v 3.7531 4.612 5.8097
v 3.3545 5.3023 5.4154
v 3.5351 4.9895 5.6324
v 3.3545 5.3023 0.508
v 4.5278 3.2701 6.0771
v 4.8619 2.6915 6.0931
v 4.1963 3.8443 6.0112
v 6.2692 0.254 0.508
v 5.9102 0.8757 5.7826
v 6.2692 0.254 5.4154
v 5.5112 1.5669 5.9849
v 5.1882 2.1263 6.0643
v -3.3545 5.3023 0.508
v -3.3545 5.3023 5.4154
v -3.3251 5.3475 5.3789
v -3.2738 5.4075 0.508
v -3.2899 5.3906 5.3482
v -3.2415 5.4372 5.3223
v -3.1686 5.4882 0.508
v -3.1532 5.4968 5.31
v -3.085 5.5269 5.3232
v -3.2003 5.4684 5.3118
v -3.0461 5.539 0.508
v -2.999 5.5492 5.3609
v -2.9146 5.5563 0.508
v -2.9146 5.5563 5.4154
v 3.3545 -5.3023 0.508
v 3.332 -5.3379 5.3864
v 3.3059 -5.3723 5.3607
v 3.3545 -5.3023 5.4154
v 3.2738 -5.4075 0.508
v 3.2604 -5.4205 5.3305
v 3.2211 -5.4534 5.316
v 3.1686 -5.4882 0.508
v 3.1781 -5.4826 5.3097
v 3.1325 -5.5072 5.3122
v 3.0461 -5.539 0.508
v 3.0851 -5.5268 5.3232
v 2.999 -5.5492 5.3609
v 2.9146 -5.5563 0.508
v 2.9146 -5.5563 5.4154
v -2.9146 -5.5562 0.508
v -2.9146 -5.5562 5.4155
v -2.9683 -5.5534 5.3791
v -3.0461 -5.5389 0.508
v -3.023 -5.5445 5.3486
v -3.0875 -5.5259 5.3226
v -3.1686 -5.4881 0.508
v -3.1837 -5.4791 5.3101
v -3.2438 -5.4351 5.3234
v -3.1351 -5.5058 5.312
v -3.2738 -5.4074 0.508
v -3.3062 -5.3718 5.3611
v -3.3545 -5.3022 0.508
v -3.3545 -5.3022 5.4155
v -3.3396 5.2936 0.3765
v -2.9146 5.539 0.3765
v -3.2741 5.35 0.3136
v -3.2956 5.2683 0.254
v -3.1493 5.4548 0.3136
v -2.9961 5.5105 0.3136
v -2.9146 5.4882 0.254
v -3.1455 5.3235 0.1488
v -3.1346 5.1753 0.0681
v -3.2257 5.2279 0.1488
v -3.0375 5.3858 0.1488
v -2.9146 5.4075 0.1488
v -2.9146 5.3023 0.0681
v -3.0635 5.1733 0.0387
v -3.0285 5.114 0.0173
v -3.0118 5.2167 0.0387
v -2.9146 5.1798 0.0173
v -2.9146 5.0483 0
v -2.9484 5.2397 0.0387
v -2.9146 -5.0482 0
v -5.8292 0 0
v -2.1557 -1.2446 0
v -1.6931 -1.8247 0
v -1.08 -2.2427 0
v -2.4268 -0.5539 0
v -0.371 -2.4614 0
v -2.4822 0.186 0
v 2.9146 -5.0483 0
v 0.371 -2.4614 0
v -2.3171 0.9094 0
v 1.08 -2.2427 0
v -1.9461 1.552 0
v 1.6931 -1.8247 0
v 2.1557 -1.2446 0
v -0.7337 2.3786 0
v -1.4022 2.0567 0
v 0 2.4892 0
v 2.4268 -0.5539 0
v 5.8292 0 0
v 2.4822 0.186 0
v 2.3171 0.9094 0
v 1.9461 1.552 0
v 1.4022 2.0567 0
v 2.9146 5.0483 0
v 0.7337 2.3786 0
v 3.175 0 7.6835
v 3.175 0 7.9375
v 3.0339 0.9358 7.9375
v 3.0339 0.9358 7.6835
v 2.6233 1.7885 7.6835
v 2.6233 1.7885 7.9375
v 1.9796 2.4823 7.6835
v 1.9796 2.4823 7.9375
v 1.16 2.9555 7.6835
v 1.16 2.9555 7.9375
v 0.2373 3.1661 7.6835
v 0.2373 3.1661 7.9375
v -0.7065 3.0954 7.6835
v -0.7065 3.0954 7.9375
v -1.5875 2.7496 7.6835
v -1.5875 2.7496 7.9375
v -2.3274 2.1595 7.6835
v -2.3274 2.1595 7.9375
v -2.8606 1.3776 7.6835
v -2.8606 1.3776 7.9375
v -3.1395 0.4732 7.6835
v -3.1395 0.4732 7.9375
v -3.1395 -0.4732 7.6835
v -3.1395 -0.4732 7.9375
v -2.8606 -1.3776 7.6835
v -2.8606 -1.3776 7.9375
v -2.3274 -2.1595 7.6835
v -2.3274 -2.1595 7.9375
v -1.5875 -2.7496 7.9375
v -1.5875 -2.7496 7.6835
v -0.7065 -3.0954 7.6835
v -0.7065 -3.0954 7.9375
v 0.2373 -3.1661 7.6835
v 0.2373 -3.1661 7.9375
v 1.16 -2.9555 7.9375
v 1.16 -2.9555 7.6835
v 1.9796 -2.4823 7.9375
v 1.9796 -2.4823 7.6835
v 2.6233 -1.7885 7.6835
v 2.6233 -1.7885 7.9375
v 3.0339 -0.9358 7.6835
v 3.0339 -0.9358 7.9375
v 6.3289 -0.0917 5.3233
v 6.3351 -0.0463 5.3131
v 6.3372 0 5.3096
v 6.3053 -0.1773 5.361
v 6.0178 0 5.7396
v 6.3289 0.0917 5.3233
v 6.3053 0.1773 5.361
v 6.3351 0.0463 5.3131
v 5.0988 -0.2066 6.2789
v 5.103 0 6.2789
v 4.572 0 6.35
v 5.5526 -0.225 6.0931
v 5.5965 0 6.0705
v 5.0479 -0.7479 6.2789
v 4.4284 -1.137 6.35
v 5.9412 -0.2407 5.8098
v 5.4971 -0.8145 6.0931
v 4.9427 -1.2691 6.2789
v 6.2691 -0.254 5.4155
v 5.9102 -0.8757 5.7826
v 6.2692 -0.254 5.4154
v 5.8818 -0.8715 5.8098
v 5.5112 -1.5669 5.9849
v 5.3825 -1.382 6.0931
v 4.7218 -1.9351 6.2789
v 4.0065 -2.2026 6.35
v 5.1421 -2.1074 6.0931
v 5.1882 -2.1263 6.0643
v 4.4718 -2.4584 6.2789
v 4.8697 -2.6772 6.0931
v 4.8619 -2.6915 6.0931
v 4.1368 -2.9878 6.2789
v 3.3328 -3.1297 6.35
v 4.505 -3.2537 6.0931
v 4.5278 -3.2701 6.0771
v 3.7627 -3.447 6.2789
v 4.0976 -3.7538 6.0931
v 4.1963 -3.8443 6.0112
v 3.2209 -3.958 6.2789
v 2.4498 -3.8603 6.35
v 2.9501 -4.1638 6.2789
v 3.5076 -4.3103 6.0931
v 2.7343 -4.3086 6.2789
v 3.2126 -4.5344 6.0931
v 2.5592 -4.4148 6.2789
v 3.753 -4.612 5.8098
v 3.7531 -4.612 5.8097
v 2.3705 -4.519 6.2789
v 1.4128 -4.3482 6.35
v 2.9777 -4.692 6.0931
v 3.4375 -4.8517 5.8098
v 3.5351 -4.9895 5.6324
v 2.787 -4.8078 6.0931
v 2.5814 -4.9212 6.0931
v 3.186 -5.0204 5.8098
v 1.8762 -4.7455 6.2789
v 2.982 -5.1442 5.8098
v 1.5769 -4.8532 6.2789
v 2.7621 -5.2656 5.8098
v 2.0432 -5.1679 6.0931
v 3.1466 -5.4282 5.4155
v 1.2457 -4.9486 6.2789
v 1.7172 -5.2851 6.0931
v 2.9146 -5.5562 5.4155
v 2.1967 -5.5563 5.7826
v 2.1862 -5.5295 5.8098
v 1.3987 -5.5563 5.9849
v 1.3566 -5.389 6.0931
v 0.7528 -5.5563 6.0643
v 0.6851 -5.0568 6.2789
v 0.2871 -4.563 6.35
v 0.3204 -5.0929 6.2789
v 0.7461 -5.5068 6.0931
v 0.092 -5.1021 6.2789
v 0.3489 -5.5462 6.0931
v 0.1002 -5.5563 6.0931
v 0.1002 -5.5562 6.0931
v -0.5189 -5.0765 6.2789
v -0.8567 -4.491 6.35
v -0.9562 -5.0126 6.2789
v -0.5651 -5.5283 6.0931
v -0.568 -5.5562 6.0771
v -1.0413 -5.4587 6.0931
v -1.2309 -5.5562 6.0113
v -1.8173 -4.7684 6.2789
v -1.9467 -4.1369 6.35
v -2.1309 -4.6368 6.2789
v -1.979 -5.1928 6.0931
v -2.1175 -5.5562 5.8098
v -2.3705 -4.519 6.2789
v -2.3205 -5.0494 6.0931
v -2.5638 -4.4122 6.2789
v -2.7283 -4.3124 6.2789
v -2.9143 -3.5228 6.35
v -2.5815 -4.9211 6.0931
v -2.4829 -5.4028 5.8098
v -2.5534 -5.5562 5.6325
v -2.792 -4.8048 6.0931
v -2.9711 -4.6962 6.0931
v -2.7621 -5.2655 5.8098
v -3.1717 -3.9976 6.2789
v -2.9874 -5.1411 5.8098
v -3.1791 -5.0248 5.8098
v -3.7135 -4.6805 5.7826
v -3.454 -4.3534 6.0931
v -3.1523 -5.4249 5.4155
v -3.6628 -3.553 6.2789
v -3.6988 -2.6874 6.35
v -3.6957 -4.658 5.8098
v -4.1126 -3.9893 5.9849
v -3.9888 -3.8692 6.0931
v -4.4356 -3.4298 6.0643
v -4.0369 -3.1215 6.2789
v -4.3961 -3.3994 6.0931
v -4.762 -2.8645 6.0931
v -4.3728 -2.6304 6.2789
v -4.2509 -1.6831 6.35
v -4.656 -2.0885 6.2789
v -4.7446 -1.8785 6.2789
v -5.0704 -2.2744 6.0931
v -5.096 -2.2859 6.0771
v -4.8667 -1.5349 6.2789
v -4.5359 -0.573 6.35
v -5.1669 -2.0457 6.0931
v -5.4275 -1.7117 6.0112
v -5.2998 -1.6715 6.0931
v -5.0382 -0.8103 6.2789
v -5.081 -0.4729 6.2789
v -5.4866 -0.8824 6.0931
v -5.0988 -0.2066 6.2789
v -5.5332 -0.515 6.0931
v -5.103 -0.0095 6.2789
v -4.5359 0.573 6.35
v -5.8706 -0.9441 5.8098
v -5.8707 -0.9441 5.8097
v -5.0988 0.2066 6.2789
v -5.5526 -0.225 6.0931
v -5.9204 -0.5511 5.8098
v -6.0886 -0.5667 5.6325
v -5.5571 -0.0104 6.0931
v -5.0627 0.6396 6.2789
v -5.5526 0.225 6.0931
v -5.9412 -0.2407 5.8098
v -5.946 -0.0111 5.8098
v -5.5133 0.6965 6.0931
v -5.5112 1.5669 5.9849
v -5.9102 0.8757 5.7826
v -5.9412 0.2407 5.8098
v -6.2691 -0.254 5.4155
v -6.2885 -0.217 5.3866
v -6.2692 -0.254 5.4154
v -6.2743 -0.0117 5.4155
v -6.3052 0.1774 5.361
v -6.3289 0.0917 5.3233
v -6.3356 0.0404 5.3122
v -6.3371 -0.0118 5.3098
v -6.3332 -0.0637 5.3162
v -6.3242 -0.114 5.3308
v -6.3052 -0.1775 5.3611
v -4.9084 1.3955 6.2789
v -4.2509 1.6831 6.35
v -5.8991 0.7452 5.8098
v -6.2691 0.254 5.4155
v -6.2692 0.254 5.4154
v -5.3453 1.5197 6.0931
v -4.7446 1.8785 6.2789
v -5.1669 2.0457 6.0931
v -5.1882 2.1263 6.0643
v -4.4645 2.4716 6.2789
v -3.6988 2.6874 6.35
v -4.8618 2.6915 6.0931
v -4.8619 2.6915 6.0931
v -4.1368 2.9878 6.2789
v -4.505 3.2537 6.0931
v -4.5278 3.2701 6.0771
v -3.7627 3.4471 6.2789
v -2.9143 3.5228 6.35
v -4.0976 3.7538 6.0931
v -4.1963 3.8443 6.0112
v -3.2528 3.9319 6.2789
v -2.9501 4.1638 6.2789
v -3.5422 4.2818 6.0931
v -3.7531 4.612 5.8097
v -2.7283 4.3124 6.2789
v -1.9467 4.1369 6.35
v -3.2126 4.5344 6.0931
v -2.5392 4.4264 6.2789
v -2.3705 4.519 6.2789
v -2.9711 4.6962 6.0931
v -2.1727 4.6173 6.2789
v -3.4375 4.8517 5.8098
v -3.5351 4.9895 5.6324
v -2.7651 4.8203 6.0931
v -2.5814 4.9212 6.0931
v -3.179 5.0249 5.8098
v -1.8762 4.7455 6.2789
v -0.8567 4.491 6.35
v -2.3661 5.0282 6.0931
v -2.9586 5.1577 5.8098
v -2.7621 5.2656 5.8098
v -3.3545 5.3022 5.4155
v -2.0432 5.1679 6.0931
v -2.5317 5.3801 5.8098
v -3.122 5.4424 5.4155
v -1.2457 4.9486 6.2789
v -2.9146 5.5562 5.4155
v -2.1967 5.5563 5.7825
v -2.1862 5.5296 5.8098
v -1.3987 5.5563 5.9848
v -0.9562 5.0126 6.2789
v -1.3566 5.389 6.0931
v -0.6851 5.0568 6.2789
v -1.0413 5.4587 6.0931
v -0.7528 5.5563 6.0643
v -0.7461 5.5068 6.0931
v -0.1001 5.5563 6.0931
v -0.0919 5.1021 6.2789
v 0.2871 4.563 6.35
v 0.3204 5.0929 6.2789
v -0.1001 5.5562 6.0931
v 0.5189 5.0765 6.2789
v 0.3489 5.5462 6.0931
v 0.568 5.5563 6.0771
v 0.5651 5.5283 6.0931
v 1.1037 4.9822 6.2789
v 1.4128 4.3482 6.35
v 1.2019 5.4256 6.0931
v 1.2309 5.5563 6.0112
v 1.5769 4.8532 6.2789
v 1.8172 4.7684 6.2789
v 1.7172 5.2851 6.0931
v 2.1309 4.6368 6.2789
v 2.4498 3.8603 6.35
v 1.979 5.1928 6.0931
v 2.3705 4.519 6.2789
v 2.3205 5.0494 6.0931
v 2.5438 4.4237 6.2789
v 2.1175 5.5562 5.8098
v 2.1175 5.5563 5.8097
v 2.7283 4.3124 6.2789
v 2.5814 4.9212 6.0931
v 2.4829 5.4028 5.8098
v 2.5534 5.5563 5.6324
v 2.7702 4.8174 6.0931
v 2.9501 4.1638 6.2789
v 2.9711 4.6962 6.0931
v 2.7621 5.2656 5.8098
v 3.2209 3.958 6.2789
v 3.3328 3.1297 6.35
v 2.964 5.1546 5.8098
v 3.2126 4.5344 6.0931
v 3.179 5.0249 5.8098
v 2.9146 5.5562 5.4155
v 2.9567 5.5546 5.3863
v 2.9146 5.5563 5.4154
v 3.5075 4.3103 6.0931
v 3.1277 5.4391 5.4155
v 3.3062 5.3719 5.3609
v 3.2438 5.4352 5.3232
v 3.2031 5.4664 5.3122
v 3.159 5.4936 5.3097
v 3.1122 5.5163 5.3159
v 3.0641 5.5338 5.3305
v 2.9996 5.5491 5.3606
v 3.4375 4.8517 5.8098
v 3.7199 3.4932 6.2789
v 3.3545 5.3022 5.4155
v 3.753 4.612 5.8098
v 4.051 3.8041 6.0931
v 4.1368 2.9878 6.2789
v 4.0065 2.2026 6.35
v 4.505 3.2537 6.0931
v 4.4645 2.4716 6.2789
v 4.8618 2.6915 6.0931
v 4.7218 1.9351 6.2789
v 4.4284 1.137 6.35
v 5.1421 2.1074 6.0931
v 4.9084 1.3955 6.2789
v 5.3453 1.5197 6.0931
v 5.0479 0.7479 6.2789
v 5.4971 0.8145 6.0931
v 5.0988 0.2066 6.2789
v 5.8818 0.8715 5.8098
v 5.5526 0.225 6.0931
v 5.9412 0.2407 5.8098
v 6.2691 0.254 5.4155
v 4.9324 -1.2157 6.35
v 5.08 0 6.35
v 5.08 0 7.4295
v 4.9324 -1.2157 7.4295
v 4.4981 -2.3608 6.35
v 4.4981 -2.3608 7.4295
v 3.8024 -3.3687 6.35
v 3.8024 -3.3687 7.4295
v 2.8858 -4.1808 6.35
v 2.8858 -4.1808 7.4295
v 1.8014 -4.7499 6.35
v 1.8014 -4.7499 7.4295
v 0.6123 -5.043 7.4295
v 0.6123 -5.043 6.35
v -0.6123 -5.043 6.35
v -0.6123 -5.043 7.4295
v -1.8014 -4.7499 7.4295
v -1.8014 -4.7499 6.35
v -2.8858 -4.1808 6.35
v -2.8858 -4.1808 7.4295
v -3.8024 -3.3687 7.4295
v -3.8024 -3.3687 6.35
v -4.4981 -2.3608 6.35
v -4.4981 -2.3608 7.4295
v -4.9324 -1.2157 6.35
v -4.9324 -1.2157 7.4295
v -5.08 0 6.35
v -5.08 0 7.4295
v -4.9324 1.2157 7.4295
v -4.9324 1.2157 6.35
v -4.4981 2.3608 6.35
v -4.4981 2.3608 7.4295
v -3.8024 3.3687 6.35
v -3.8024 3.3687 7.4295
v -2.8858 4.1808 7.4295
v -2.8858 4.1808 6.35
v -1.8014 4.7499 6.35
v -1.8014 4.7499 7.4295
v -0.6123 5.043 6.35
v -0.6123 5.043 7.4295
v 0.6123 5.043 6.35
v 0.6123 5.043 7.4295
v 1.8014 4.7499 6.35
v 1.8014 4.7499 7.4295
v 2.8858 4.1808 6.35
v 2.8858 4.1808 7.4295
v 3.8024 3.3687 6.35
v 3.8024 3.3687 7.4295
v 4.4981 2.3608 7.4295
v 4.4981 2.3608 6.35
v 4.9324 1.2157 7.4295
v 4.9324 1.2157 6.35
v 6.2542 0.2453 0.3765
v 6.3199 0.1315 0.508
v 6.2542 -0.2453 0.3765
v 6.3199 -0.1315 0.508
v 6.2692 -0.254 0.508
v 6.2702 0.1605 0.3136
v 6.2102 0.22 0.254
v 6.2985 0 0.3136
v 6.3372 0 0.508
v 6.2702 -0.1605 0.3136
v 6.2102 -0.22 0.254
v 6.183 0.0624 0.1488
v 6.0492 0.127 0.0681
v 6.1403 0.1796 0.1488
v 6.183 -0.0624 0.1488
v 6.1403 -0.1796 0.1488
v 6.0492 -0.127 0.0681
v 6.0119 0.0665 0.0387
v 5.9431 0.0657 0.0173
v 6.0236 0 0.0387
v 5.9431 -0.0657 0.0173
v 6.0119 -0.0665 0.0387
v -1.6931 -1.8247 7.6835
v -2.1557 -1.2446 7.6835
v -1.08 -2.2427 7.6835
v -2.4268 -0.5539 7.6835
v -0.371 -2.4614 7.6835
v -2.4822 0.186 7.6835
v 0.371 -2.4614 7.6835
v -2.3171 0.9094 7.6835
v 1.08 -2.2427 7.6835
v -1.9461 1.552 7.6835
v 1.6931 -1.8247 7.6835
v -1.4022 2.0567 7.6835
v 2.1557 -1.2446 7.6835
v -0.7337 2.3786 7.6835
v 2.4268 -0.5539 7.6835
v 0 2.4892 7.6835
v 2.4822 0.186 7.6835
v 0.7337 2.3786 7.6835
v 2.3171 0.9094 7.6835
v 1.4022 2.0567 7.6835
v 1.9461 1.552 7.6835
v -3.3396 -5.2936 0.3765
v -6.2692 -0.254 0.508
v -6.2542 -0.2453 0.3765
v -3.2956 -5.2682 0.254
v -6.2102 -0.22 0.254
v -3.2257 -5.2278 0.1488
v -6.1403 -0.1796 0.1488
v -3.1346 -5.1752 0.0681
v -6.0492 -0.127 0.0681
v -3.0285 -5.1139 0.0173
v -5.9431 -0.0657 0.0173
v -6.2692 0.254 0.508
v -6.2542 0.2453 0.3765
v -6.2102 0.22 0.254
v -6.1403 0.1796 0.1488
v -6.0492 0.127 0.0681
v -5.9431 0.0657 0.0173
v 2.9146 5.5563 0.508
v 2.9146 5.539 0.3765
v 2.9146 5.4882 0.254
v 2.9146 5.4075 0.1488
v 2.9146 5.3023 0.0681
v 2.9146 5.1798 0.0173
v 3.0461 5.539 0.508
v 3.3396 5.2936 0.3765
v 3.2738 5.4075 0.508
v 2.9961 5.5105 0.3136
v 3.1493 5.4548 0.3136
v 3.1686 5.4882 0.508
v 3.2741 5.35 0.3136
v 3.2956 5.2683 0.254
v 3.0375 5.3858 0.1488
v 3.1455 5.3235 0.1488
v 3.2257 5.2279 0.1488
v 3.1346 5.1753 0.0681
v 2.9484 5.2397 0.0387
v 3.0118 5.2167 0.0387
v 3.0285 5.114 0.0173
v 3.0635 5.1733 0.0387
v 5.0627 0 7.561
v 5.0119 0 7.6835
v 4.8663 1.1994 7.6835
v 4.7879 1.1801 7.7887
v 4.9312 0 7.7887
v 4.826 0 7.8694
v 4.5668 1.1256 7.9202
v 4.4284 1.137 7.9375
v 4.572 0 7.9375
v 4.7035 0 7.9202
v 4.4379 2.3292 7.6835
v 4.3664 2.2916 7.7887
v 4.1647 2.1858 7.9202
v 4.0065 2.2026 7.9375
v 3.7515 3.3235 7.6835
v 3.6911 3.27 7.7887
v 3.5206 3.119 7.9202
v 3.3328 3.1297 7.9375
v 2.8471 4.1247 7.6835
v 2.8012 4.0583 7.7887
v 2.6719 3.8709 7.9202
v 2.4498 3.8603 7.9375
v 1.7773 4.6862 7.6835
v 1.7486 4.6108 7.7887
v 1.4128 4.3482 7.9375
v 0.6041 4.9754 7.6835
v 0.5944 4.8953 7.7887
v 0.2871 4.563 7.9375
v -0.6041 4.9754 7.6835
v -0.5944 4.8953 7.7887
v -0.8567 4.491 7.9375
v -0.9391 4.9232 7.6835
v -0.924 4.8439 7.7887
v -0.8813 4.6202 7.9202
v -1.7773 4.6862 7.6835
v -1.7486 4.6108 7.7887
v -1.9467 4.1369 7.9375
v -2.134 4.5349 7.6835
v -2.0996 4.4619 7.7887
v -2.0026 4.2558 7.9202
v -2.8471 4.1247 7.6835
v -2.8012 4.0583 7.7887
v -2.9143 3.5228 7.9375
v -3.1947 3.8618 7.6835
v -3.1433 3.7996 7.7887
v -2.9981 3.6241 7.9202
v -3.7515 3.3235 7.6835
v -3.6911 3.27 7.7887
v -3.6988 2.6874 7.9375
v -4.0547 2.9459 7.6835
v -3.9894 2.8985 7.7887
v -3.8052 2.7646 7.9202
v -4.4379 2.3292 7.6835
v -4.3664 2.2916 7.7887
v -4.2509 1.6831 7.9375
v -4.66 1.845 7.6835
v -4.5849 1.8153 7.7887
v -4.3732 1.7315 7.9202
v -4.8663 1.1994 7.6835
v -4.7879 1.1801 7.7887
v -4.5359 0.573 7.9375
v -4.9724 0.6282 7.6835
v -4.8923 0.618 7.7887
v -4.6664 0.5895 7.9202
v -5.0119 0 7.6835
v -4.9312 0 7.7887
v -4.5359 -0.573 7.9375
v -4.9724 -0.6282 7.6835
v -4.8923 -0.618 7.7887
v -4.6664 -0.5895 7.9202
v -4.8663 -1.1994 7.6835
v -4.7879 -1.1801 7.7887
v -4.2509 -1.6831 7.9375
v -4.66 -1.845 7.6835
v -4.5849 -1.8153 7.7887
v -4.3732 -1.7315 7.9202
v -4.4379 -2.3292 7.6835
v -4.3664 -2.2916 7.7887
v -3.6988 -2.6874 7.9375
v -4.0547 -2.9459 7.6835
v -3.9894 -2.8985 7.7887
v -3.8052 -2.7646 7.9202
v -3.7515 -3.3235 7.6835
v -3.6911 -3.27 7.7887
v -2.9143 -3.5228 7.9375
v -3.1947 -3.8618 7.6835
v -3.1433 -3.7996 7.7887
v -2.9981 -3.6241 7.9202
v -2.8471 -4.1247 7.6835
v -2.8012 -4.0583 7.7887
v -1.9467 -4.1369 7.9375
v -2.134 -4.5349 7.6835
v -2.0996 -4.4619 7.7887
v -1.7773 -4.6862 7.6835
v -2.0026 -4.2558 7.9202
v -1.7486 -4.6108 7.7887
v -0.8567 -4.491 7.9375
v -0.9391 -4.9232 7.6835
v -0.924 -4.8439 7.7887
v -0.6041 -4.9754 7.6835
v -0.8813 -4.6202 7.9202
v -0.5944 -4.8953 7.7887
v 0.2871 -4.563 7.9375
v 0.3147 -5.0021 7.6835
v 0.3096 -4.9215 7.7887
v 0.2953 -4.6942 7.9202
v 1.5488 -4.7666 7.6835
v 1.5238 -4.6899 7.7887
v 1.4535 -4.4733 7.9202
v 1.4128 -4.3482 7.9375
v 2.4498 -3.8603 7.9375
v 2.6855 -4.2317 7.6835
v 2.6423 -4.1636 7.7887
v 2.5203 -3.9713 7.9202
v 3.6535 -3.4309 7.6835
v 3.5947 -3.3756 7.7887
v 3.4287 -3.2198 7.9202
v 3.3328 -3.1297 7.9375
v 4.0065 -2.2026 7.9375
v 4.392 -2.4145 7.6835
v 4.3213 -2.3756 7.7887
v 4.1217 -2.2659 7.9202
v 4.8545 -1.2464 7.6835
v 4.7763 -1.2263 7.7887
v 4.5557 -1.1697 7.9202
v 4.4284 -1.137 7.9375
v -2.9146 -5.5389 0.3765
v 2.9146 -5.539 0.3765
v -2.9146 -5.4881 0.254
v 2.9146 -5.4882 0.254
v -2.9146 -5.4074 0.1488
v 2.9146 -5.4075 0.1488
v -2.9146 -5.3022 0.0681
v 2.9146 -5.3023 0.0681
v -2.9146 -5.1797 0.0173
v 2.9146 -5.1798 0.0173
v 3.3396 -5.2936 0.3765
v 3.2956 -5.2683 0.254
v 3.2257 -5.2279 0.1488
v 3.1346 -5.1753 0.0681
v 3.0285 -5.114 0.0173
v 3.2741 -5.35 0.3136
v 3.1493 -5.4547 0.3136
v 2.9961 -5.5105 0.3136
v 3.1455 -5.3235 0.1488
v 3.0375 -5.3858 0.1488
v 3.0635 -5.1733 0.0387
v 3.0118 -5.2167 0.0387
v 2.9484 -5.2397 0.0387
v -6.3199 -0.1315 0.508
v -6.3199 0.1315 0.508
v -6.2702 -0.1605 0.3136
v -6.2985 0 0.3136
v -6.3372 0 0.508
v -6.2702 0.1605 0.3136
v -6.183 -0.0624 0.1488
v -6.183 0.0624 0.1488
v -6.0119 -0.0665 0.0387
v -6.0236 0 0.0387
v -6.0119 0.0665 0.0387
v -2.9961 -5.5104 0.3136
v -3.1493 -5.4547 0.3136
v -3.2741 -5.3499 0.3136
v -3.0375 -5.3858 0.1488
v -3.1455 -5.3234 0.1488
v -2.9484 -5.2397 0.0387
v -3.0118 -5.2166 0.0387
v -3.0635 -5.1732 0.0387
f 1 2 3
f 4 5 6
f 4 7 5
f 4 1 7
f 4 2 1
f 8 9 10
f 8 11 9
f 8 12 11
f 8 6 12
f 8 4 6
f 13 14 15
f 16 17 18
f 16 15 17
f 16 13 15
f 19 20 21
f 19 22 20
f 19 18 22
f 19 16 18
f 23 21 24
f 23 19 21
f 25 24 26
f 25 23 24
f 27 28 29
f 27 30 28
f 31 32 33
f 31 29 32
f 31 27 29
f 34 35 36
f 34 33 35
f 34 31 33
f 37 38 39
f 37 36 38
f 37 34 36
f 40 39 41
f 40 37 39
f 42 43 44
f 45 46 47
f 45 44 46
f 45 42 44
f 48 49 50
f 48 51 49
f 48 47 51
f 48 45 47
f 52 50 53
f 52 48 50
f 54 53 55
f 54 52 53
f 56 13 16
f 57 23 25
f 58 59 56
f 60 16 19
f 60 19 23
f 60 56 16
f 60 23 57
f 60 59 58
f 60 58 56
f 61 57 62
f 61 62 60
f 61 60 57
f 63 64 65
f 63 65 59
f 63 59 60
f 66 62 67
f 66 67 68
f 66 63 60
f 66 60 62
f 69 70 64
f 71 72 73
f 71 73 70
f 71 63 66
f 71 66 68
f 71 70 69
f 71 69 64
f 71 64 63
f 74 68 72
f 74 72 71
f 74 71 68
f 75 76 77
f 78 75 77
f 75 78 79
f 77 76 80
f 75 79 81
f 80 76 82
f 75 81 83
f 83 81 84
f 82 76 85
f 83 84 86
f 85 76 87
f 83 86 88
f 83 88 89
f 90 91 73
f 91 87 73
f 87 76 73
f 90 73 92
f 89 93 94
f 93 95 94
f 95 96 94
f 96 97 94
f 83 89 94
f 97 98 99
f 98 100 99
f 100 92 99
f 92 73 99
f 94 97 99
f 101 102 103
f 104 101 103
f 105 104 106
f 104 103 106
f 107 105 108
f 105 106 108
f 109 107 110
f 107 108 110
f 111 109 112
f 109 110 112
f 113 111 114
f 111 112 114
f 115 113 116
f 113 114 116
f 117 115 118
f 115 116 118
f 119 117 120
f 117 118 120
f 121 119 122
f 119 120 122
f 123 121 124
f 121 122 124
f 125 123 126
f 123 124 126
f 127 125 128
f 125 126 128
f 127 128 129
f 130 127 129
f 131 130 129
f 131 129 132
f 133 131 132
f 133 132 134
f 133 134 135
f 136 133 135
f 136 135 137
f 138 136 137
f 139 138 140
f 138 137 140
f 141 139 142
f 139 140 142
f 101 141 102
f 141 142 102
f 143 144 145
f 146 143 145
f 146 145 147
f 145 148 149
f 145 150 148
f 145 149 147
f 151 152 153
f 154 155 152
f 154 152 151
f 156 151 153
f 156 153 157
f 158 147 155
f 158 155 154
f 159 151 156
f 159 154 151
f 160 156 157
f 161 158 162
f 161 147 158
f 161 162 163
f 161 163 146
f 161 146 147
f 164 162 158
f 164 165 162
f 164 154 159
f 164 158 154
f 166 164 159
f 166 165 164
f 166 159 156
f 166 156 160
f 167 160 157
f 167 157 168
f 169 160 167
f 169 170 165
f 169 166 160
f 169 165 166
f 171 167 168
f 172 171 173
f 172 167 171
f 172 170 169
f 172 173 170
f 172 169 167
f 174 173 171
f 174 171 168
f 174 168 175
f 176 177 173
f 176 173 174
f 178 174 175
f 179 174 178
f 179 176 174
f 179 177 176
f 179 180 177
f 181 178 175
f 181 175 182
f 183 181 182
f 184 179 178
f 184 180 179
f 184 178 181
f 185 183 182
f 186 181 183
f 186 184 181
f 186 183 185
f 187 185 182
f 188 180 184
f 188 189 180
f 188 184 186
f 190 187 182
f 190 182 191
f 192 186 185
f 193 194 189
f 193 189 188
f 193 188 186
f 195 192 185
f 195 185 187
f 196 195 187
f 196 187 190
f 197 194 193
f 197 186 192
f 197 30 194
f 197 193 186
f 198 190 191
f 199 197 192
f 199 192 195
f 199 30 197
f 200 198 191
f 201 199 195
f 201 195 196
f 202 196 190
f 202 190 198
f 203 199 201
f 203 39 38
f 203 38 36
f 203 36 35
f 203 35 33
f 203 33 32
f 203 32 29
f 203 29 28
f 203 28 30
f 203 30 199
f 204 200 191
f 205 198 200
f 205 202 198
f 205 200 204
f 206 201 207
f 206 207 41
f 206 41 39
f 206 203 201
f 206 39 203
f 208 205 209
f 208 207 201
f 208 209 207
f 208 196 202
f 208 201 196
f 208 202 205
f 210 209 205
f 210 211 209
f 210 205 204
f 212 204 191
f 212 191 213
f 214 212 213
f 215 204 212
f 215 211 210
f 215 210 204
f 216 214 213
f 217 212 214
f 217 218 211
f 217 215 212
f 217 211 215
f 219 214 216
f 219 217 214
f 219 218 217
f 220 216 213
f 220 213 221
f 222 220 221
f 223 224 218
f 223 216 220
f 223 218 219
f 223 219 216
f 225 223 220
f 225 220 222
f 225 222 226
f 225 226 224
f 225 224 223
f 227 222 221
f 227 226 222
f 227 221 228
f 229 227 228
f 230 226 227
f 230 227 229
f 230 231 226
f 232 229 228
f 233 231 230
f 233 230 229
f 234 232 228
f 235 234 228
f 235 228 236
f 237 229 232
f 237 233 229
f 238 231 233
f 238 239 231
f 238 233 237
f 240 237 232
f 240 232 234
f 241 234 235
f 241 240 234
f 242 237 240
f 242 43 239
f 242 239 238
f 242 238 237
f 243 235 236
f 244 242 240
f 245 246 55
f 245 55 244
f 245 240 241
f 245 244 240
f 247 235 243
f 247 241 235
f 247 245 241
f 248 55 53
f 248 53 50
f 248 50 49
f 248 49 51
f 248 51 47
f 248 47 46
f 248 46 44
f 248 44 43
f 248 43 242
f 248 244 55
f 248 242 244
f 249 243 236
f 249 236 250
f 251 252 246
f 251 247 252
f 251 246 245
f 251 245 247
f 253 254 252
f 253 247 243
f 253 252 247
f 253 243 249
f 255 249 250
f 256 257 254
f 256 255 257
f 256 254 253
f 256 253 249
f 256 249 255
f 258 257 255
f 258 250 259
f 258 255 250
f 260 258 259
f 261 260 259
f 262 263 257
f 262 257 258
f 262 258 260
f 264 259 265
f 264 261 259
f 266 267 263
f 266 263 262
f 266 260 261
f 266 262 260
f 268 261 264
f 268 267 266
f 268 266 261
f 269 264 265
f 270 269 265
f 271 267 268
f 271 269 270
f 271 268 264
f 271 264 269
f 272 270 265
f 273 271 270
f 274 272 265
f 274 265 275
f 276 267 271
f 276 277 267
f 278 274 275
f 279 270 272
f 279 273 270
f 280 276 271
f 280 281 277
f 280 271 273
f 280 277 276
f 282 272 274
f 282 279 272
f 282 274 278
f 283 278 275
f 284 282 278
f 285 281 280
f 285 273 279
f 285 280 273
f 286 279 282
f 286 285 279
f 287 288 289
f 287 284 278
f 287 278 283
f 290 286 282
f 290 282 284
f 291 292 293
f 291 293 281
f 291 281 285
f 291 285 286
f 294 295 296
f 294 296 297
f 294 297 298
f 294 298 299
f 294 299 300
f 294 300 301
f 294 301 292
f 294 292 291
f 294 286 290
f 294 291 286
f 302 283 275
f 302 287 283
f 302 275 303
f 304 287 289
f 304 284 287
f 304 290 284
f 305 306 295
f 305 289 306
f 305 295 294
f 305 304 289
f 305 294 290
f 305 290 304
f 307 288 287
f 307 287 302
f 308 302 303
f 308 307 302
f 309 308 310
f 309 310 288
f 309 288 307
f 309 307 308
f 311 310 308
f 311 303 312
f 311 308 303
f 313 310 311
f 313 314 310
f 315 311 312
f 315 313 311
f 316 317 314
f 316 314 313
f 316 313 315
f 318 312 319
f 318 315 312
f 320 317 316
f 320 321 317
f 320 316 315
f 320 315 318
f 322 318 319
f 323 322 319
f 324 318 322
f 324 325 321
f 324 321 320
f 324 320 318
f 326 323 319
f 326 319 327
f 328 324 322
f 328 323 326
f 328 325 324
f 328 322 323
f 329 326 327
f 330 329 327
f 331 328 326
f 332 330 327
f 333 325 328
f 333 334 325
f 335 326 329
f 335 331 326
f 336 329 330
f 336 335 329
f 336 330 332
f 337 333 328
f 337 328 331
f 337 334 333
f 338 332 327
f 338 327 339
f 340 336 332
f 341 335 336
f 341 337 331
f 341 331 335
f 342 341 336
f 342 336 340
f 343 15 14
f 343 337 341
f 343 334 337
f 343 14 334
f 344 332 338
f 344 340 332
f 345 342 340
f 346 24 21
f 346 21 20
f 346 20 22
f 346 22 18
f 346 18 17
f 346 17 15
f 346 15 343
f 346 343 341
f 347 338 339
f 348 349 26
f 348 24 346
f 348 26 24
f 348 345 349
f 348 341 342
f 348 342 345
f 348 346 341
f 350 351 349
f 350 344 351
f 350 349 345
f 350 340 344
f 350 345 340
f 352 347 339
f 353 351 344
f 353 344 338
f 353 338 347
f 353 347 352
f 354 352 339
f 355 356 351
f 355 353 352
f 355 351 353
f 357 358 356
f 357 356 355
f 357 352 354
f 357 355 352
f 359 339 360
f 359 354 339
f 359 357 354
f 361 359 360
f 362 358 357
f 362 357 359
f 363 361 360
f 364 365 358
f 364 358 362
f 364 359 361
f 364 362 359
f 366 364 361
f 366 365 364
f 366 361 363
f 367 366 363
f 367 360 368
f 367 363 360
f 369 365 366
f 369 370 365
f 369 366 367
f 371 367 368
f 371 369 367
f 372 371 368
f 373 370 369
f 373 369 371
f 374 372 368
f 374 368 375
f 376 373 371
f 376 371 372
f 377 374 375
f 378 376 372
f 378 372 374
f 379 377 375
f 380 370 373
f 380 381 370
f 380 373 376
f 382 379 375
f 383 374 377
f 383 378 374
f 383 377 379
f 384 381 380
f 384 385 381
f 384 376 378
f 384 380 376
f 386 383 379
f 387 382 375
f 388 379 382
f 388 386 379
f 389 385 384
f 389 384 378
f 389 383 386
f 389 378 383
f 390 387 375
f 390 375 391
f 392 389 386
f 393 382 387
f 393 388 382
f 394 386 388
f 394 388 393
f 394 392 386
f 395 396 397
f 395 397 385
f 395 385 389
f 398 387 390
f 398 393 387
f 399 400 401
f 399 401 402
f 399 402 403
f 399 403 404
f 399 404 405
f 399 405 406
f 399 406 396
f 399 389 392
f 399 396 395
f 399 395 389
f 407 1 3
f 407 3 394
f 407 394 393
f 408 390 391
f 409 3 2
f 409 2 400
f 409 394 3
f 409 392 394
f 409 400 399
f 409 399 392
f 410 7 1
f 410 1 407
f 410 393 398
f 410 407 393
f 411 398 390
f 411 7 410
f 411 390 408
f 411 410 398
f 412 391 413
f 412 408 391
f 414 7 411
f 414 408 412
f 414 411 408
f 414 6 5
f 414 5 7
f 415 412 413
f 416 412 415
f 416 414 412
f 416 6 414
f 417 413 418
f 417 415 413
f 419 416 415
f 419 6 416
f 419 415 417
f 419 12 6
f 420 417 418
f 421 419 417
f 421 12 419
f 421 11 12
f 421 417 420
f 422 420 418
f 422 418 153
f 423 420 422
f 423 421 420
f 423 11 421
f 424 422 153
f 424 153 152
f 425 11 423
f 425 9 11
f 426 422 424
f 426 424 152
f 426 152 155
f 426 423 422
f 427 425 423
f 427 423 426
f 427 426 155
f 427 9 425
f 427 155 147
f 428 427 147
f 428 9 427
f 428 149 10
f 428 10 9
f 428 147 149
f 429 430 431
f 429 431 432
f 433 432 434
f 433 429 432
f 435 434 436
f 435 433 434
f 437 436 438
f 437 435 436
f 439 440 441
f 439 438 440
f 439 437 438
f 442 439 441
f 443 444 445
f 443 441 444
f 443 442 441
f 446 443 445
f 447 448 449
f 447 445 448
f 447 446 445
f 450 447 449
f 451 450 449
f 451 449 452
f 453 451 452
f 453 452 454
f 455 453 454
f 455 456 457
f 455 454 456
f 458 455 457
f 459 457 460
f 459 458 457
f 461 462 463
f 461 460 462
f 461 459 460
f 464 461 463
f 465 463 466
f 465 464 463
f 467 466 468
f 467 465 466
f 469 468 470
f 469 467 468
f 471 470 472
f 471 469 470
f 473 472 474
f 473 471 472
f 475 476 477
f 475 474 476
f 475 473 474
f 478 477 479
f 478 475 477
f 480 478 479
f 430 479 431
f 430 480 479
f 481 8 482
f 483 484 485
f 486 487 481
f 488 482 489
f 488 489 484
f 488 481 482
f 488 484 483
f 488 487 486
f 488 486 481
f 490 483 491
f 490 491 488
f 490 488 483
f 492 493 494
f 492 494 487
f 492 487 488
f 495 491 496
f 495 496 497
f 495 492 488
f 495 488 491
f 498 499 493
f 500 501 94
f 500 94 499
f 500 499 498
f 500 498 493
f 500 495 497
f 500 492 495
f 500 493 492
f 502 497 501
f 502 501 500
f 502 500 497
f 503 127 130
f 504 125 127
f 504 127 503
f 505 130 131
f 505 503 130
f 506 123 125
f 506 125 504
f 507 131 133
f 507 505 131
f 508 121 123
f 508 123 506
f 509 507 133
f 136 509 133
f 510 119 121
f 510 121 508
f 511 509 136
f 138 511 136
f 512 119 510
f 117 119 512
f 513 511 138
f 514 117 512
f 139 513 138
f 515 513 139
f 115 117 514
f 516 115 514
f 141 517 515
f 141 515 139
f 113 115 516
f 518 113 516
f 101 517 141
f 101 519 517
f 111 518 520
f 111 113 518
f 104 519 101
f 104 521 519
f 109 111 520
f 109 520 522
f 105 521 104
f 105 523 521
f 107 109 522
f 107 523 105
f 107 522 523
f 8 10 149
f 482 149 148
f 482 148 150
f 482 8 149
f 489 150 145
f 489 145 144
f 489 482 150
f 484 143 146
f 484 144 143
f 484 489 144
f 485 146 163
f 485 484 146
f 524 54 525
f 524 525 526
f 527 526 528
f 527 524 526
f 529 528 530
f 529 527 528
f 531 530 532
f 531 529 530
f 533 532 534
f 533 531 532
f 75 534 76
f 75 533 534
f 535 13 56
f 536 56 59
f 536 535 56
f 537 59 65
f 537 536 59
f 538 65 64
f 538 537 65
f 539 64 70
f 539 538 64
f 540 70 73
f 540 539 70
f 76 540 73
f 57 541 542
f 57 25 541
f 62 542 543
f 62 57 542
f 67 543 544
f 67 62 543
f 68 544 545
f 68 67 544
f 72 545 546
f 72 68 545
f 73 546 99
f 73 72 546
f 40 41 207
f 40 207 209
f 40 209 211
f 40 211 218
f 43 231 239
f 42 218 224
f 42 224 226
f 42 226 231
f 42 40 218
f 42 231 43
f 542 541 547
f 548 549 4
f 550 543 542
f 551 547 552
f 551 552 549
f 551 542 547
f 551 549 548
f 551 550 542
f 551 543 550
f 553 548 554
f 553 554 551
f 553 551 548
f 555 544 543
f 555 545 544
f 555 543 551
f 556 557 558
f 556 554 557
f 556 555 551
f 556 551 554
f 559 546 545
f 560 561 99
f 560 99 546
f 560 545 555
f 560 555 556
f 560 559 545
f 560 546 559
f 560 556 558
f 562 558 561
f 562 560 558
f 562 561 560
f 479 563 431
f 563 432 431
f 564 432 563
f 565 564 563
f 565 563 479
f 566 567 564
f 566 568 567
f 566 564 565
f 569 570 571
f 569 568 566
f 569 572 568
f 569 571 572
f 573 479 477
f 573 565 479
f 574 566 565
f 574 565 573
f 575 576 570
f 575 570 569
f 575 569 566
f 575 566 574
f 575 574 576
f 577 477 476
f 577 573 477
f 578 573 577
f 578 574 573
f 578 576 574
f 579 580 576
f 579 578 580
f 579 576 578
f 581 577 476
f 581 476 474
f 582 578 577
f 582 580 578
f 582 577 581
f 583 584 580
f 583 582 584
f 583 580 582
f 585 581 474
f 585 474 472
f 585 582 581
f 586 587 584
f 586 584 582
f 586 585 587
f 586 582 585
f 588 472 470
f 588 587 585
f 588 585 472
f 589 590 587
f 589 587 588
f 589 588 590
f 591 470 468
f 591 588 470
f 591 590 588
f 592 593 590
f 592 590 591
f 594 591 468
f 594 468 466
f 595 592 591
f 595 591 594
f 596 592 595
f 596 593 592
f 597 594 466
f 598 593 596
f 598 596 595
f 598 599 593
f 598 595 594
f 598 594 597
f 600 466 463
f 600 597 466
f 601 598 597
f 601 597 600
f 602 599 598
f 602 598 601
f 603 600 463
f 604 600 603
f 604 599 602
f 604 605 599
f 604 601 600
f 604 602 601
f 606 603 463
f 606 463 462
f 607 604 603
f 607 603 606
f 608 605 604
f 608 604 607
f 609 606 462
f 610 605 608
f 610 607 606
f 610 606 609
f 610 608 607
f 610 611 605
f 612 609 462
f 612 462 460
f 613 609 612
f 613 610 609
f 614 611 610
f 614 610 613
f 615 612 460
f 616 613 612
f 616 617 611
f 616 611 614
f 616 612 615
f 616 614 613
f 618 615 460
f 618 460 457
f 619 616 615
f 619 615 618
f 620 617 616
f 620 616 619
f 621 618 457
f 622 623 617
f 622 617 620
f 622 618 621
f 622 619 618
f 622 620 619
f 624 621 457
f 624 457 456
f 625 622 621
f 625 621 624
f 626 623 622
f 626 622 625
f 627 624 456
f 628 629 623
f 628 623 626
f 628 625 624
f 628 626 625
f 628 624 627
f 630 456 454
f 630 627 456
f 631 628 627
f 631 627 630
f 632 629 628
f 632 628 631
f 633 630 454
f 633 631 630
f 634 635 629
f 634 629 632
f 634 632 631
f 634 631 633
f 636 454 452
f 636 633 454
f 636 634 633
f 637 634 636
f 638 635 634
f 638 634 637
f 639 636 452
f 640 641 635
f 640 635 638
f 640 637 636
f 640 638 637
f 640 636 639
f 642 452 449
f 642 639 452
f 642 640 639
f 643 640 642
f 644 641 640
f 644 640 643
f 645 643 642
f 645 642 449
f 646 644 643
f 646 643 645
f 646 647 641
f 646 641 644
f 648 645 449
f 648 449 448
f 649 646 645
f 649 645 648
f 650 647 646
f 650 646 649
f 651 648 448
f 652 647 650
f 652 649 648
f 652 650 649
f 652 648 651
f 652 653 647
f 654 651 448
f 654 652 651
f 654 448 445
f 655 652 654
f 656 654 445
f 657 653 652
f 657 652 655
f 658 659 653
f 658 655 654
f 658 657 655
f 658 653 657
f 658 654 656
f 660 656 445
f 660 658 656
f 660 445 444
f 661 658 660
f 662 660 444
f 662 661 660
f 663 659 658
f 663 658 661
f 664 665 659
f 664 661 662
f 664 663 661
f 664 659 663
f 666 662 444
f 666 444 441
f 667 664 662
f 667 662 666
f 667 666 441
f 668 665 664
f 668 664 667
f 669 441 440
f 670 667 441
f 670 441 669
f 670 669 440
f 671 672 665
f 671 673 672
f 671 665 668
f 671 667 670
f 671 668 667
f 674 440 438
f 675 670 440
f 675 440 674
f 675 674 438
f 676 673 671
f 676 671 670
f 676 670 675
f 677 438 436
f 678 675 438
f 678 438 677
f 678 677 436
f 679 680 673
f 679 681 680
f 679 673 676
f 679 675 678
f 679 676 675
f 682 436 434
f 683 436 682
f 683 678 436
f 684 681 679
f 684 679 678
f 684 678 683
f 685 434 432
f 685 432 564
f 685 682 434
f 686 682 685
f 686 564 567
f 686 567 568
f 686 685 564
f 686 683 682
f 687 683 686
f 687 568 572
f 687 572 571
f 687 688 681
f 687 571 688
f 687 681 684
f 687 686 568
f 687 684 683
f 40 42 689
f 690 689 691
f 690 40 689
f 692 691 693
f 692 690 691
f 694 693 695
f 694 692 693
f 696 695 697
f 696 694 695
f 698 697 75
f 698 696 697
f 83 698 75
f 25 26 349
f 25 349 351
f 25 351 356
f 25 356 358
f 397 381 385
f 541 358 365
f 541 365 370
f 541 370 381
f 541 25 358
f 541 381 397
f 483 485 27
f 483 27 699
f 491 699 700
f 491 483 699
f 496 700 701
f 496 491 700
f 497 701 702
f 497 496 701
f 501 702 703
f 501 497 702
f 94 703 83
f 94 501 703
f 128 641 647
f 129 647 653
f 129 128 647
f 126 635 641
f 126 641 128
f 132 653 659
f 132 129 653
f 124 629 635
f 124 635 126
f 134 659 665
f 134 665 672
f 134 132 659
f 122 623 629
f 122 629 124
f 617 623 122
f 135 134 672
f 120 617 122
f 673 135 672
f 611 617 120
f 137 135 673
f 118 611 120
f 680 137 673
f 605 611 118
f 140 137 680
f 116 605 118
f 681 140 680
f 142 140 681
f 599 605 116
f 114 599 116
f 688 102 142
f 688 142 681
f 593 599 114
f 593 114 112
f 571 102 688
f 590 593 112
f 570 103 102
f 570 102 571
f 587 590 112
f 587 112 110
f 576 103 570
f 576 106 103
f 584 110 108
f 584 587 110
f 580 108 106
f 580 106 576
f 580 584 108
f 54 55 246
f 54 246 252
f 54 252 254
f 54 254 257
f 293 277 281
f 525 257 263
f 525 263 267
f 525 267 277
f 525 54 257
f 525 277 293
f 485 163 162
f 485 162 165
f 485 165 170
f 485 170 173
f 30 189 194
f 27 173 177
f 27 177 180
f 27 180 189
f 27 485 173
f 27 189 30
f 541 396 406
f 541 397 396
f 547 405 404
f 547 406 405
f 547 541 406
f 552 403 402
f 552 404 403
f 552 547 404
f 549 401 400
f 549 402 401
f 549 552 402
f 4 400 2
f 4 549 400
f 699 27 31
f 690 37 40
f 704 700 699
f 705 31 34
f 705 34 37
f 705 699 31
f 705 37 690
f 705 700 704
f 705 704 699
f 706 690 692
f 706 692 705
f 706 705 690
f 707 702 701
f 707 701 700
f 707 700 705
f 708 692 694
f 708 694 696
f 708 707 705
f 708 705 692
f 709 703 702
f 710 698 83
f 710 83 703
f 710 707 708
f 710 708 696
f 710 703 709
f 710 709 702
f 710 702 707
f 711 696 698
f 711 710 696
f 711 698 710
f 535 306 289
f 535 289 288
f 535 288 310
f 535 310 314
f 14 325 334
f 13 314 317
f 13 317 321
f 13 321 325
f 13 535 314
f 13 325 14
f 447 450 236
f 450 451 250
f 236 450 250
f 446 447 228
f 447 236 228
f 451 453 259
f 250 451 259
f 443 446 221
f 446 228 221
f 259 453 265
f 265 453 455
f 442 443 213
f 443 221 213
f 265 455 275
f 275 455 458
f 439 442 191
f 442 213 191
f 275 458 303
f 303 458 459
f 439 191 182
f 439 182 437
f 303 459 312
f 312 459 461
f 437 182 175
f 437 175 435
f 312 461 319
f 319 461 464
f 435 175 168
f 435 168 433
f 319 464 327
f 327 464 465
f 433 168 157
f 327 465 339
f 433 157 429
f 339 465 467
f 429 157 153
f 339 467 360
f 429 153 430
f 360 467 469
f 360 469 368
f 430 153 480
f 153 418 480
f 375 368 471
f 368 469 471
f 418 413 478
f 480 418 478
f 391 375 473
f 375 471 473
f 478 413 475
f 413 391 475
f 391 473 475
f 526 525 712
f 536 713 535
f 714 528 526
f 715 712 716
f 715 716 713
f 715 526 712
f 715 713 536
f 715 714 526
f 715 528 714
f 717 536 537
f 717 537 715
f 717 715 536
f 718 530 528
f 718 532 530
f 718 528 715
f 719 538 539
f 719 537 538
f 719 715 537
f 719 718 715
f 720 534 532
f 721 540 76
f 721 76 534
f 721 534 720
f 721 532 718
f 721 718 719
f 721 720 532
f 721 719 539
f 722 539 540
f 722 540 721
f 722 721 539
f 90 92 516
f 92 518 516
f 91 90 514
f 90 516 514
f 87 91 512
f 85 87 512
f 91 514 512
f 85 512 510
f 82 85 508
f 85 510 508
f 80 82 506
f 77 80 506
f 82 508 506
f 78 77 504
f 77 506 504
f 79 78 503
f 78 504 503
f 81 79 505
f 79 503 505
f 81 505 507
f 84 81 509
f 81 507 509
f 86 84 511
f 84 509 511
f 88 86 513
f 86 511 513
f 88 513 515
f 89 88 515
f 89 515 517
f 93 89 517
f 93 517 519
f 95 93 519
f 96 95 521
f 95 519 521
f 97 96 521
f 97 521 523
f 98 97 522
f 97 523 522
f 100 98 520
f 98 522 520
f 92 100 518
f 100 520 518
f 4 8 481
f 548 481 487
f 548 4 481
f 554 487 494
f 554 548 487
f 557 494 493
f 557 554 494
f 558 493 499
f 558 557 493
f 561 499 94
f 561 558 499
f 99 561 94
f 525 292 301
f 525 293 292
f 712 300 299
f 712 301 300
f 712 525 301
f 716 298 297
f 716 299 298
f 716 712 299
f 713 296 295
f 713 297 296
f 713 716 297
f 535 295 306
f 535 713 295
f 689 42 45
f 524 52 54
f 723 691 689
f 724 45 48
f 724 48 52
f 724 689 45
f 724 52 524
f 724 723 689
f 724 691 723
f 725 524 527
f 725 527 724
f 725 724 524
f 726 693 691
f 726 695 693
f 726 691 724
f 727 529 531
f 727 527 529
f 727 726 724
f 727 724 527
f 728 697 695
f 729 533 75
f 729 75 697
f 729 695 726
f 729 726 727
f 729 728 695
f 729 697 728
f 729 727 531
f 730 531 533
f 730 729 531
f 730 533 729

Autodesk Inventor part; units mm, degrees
ref_plane "YZ Plane" through (0, 0, 0) normal (1, 0, 0) x (0, 1, 0)
ref_plane "XZ Plane" through (0, 0, 0) normal (0, 1, 0) x (-1, 0, 0)
ref_plane "XY Plane" through (0, 0, 0) normal (0, 0, 1) x (1, 0, 0)
sketch "Sketch1" plane through (0, 0, 0) normal (0, 0, 1) x (1, 0, 0)
  line L0 (-3.2079, 5.5563) -> (3.2079, 5.5563)
  line L1 (3.2079, 5.5563) -> (6.4158, 0)
  line L2 (6.4158, 0) -> (3.2079, -5.5563)
  line L3 (3.2079, -5.5563) -> (-3.2079, -5.5562)
  line L4 (-3.2079, -5.5562) -> (-6.4158, 0)
  line L5 (-6.4158, 0) -> (-3.2079, 5.5563)
  point P0 (0, 0)
  point P1 (0, 0)
  dimension "d0" = 11.1125
extrude "Extrusion1" add sketch "Sketch1" along normal blind 6.35
sketch "Sketch3" plane through (0, 0, 6.35) normal (0, 0, 1) x (1, 0, 0)
  circle A0 centre (0, 0) radius 5.08
  dimension "d28" = 10.16
extrude "Extrusion2" add sketch "Sketch3" along normal blind 1.5875
sketch "Sketch8" plane through (0, 0, 7.9375) normal (0, 0, 1) x (1, 0, 0)
  circle A0 centre (0, 0) radius 5.08 projected
  circle A1 centre (0, 0) radius 3.175
  dimension "d29" = 6.35
sketch "Sketch9" plane through (0, 0, 0) normal (0, 0, -1) x (-1, 0, 0)
  point P0 (0, 0)
hole "Hole2" at (0, 0, 0) direction (0, 0, 1) diameter 4.9784 end through all thread size "1/4-20 UNC" class "2B" standard "ANSI Unified Screw Threads"
sketch "Sketch10" plane through (0, 0, 0) normal (0, 1, 0) x (-1, 0, 0)
  line L0 (-6.4158, 6.35) -> (-3.2079, 6.35) projected
  line L1 (-3.2079, 0) -> (-3.2079, 6.35) projected
  line L2 (-6.4158, 0) -> (-3.2079, 0) projected
  line L3 (-6.4158, 0) -> (-6.4158, 6.35) projected
  line L4 (0, 0) -> (0, 6.9243)
  arc A0 (-4.572, 6.35) -> (-6.4158, 5.1517) centre (-4.572, 4.3324) ccw
  line L5 (-6.4158, 5.1517) -> (-6.4158, 6.35)
  line L6 (-4.572, 6.35) -> (-6.4158, 6.35)
  dimension "d24" = 4.572
revolve "Revolution2" cut sketch "Sketch10" angle 360 about axis through (0, 0, 0) along (0, 0, 1) contours L0 A0 L3
fillet "Fillet1" radius 0.508 12 edges at (-3.2079, -5.5562, 2.5758) (3.2079, -5.5563, 2.5758) (6.4158, 0, 2.5758) (3.2079, 5.5563, 2.5758) (-6.4158, 0, 2.5758) (-3.2079, 5.5563, 2.5758) (0, 5.5563, 0) (4.8119, 2.7781, 0) (4.8119, -2.7781, 0) (0, -5.5563, 0) (-4.8119, -2.7781, 0) (-4.8119, 2.7781, 0)
fillet "Fillet2" radius 0.508 1 edges at (-5.08, 0, 7.9375)
extrude "Extrusion4" cut sketch "Sketch8" against normal blind 0.254 contours A1
properties part number "14-20 regular lock nut" material "Steel"
